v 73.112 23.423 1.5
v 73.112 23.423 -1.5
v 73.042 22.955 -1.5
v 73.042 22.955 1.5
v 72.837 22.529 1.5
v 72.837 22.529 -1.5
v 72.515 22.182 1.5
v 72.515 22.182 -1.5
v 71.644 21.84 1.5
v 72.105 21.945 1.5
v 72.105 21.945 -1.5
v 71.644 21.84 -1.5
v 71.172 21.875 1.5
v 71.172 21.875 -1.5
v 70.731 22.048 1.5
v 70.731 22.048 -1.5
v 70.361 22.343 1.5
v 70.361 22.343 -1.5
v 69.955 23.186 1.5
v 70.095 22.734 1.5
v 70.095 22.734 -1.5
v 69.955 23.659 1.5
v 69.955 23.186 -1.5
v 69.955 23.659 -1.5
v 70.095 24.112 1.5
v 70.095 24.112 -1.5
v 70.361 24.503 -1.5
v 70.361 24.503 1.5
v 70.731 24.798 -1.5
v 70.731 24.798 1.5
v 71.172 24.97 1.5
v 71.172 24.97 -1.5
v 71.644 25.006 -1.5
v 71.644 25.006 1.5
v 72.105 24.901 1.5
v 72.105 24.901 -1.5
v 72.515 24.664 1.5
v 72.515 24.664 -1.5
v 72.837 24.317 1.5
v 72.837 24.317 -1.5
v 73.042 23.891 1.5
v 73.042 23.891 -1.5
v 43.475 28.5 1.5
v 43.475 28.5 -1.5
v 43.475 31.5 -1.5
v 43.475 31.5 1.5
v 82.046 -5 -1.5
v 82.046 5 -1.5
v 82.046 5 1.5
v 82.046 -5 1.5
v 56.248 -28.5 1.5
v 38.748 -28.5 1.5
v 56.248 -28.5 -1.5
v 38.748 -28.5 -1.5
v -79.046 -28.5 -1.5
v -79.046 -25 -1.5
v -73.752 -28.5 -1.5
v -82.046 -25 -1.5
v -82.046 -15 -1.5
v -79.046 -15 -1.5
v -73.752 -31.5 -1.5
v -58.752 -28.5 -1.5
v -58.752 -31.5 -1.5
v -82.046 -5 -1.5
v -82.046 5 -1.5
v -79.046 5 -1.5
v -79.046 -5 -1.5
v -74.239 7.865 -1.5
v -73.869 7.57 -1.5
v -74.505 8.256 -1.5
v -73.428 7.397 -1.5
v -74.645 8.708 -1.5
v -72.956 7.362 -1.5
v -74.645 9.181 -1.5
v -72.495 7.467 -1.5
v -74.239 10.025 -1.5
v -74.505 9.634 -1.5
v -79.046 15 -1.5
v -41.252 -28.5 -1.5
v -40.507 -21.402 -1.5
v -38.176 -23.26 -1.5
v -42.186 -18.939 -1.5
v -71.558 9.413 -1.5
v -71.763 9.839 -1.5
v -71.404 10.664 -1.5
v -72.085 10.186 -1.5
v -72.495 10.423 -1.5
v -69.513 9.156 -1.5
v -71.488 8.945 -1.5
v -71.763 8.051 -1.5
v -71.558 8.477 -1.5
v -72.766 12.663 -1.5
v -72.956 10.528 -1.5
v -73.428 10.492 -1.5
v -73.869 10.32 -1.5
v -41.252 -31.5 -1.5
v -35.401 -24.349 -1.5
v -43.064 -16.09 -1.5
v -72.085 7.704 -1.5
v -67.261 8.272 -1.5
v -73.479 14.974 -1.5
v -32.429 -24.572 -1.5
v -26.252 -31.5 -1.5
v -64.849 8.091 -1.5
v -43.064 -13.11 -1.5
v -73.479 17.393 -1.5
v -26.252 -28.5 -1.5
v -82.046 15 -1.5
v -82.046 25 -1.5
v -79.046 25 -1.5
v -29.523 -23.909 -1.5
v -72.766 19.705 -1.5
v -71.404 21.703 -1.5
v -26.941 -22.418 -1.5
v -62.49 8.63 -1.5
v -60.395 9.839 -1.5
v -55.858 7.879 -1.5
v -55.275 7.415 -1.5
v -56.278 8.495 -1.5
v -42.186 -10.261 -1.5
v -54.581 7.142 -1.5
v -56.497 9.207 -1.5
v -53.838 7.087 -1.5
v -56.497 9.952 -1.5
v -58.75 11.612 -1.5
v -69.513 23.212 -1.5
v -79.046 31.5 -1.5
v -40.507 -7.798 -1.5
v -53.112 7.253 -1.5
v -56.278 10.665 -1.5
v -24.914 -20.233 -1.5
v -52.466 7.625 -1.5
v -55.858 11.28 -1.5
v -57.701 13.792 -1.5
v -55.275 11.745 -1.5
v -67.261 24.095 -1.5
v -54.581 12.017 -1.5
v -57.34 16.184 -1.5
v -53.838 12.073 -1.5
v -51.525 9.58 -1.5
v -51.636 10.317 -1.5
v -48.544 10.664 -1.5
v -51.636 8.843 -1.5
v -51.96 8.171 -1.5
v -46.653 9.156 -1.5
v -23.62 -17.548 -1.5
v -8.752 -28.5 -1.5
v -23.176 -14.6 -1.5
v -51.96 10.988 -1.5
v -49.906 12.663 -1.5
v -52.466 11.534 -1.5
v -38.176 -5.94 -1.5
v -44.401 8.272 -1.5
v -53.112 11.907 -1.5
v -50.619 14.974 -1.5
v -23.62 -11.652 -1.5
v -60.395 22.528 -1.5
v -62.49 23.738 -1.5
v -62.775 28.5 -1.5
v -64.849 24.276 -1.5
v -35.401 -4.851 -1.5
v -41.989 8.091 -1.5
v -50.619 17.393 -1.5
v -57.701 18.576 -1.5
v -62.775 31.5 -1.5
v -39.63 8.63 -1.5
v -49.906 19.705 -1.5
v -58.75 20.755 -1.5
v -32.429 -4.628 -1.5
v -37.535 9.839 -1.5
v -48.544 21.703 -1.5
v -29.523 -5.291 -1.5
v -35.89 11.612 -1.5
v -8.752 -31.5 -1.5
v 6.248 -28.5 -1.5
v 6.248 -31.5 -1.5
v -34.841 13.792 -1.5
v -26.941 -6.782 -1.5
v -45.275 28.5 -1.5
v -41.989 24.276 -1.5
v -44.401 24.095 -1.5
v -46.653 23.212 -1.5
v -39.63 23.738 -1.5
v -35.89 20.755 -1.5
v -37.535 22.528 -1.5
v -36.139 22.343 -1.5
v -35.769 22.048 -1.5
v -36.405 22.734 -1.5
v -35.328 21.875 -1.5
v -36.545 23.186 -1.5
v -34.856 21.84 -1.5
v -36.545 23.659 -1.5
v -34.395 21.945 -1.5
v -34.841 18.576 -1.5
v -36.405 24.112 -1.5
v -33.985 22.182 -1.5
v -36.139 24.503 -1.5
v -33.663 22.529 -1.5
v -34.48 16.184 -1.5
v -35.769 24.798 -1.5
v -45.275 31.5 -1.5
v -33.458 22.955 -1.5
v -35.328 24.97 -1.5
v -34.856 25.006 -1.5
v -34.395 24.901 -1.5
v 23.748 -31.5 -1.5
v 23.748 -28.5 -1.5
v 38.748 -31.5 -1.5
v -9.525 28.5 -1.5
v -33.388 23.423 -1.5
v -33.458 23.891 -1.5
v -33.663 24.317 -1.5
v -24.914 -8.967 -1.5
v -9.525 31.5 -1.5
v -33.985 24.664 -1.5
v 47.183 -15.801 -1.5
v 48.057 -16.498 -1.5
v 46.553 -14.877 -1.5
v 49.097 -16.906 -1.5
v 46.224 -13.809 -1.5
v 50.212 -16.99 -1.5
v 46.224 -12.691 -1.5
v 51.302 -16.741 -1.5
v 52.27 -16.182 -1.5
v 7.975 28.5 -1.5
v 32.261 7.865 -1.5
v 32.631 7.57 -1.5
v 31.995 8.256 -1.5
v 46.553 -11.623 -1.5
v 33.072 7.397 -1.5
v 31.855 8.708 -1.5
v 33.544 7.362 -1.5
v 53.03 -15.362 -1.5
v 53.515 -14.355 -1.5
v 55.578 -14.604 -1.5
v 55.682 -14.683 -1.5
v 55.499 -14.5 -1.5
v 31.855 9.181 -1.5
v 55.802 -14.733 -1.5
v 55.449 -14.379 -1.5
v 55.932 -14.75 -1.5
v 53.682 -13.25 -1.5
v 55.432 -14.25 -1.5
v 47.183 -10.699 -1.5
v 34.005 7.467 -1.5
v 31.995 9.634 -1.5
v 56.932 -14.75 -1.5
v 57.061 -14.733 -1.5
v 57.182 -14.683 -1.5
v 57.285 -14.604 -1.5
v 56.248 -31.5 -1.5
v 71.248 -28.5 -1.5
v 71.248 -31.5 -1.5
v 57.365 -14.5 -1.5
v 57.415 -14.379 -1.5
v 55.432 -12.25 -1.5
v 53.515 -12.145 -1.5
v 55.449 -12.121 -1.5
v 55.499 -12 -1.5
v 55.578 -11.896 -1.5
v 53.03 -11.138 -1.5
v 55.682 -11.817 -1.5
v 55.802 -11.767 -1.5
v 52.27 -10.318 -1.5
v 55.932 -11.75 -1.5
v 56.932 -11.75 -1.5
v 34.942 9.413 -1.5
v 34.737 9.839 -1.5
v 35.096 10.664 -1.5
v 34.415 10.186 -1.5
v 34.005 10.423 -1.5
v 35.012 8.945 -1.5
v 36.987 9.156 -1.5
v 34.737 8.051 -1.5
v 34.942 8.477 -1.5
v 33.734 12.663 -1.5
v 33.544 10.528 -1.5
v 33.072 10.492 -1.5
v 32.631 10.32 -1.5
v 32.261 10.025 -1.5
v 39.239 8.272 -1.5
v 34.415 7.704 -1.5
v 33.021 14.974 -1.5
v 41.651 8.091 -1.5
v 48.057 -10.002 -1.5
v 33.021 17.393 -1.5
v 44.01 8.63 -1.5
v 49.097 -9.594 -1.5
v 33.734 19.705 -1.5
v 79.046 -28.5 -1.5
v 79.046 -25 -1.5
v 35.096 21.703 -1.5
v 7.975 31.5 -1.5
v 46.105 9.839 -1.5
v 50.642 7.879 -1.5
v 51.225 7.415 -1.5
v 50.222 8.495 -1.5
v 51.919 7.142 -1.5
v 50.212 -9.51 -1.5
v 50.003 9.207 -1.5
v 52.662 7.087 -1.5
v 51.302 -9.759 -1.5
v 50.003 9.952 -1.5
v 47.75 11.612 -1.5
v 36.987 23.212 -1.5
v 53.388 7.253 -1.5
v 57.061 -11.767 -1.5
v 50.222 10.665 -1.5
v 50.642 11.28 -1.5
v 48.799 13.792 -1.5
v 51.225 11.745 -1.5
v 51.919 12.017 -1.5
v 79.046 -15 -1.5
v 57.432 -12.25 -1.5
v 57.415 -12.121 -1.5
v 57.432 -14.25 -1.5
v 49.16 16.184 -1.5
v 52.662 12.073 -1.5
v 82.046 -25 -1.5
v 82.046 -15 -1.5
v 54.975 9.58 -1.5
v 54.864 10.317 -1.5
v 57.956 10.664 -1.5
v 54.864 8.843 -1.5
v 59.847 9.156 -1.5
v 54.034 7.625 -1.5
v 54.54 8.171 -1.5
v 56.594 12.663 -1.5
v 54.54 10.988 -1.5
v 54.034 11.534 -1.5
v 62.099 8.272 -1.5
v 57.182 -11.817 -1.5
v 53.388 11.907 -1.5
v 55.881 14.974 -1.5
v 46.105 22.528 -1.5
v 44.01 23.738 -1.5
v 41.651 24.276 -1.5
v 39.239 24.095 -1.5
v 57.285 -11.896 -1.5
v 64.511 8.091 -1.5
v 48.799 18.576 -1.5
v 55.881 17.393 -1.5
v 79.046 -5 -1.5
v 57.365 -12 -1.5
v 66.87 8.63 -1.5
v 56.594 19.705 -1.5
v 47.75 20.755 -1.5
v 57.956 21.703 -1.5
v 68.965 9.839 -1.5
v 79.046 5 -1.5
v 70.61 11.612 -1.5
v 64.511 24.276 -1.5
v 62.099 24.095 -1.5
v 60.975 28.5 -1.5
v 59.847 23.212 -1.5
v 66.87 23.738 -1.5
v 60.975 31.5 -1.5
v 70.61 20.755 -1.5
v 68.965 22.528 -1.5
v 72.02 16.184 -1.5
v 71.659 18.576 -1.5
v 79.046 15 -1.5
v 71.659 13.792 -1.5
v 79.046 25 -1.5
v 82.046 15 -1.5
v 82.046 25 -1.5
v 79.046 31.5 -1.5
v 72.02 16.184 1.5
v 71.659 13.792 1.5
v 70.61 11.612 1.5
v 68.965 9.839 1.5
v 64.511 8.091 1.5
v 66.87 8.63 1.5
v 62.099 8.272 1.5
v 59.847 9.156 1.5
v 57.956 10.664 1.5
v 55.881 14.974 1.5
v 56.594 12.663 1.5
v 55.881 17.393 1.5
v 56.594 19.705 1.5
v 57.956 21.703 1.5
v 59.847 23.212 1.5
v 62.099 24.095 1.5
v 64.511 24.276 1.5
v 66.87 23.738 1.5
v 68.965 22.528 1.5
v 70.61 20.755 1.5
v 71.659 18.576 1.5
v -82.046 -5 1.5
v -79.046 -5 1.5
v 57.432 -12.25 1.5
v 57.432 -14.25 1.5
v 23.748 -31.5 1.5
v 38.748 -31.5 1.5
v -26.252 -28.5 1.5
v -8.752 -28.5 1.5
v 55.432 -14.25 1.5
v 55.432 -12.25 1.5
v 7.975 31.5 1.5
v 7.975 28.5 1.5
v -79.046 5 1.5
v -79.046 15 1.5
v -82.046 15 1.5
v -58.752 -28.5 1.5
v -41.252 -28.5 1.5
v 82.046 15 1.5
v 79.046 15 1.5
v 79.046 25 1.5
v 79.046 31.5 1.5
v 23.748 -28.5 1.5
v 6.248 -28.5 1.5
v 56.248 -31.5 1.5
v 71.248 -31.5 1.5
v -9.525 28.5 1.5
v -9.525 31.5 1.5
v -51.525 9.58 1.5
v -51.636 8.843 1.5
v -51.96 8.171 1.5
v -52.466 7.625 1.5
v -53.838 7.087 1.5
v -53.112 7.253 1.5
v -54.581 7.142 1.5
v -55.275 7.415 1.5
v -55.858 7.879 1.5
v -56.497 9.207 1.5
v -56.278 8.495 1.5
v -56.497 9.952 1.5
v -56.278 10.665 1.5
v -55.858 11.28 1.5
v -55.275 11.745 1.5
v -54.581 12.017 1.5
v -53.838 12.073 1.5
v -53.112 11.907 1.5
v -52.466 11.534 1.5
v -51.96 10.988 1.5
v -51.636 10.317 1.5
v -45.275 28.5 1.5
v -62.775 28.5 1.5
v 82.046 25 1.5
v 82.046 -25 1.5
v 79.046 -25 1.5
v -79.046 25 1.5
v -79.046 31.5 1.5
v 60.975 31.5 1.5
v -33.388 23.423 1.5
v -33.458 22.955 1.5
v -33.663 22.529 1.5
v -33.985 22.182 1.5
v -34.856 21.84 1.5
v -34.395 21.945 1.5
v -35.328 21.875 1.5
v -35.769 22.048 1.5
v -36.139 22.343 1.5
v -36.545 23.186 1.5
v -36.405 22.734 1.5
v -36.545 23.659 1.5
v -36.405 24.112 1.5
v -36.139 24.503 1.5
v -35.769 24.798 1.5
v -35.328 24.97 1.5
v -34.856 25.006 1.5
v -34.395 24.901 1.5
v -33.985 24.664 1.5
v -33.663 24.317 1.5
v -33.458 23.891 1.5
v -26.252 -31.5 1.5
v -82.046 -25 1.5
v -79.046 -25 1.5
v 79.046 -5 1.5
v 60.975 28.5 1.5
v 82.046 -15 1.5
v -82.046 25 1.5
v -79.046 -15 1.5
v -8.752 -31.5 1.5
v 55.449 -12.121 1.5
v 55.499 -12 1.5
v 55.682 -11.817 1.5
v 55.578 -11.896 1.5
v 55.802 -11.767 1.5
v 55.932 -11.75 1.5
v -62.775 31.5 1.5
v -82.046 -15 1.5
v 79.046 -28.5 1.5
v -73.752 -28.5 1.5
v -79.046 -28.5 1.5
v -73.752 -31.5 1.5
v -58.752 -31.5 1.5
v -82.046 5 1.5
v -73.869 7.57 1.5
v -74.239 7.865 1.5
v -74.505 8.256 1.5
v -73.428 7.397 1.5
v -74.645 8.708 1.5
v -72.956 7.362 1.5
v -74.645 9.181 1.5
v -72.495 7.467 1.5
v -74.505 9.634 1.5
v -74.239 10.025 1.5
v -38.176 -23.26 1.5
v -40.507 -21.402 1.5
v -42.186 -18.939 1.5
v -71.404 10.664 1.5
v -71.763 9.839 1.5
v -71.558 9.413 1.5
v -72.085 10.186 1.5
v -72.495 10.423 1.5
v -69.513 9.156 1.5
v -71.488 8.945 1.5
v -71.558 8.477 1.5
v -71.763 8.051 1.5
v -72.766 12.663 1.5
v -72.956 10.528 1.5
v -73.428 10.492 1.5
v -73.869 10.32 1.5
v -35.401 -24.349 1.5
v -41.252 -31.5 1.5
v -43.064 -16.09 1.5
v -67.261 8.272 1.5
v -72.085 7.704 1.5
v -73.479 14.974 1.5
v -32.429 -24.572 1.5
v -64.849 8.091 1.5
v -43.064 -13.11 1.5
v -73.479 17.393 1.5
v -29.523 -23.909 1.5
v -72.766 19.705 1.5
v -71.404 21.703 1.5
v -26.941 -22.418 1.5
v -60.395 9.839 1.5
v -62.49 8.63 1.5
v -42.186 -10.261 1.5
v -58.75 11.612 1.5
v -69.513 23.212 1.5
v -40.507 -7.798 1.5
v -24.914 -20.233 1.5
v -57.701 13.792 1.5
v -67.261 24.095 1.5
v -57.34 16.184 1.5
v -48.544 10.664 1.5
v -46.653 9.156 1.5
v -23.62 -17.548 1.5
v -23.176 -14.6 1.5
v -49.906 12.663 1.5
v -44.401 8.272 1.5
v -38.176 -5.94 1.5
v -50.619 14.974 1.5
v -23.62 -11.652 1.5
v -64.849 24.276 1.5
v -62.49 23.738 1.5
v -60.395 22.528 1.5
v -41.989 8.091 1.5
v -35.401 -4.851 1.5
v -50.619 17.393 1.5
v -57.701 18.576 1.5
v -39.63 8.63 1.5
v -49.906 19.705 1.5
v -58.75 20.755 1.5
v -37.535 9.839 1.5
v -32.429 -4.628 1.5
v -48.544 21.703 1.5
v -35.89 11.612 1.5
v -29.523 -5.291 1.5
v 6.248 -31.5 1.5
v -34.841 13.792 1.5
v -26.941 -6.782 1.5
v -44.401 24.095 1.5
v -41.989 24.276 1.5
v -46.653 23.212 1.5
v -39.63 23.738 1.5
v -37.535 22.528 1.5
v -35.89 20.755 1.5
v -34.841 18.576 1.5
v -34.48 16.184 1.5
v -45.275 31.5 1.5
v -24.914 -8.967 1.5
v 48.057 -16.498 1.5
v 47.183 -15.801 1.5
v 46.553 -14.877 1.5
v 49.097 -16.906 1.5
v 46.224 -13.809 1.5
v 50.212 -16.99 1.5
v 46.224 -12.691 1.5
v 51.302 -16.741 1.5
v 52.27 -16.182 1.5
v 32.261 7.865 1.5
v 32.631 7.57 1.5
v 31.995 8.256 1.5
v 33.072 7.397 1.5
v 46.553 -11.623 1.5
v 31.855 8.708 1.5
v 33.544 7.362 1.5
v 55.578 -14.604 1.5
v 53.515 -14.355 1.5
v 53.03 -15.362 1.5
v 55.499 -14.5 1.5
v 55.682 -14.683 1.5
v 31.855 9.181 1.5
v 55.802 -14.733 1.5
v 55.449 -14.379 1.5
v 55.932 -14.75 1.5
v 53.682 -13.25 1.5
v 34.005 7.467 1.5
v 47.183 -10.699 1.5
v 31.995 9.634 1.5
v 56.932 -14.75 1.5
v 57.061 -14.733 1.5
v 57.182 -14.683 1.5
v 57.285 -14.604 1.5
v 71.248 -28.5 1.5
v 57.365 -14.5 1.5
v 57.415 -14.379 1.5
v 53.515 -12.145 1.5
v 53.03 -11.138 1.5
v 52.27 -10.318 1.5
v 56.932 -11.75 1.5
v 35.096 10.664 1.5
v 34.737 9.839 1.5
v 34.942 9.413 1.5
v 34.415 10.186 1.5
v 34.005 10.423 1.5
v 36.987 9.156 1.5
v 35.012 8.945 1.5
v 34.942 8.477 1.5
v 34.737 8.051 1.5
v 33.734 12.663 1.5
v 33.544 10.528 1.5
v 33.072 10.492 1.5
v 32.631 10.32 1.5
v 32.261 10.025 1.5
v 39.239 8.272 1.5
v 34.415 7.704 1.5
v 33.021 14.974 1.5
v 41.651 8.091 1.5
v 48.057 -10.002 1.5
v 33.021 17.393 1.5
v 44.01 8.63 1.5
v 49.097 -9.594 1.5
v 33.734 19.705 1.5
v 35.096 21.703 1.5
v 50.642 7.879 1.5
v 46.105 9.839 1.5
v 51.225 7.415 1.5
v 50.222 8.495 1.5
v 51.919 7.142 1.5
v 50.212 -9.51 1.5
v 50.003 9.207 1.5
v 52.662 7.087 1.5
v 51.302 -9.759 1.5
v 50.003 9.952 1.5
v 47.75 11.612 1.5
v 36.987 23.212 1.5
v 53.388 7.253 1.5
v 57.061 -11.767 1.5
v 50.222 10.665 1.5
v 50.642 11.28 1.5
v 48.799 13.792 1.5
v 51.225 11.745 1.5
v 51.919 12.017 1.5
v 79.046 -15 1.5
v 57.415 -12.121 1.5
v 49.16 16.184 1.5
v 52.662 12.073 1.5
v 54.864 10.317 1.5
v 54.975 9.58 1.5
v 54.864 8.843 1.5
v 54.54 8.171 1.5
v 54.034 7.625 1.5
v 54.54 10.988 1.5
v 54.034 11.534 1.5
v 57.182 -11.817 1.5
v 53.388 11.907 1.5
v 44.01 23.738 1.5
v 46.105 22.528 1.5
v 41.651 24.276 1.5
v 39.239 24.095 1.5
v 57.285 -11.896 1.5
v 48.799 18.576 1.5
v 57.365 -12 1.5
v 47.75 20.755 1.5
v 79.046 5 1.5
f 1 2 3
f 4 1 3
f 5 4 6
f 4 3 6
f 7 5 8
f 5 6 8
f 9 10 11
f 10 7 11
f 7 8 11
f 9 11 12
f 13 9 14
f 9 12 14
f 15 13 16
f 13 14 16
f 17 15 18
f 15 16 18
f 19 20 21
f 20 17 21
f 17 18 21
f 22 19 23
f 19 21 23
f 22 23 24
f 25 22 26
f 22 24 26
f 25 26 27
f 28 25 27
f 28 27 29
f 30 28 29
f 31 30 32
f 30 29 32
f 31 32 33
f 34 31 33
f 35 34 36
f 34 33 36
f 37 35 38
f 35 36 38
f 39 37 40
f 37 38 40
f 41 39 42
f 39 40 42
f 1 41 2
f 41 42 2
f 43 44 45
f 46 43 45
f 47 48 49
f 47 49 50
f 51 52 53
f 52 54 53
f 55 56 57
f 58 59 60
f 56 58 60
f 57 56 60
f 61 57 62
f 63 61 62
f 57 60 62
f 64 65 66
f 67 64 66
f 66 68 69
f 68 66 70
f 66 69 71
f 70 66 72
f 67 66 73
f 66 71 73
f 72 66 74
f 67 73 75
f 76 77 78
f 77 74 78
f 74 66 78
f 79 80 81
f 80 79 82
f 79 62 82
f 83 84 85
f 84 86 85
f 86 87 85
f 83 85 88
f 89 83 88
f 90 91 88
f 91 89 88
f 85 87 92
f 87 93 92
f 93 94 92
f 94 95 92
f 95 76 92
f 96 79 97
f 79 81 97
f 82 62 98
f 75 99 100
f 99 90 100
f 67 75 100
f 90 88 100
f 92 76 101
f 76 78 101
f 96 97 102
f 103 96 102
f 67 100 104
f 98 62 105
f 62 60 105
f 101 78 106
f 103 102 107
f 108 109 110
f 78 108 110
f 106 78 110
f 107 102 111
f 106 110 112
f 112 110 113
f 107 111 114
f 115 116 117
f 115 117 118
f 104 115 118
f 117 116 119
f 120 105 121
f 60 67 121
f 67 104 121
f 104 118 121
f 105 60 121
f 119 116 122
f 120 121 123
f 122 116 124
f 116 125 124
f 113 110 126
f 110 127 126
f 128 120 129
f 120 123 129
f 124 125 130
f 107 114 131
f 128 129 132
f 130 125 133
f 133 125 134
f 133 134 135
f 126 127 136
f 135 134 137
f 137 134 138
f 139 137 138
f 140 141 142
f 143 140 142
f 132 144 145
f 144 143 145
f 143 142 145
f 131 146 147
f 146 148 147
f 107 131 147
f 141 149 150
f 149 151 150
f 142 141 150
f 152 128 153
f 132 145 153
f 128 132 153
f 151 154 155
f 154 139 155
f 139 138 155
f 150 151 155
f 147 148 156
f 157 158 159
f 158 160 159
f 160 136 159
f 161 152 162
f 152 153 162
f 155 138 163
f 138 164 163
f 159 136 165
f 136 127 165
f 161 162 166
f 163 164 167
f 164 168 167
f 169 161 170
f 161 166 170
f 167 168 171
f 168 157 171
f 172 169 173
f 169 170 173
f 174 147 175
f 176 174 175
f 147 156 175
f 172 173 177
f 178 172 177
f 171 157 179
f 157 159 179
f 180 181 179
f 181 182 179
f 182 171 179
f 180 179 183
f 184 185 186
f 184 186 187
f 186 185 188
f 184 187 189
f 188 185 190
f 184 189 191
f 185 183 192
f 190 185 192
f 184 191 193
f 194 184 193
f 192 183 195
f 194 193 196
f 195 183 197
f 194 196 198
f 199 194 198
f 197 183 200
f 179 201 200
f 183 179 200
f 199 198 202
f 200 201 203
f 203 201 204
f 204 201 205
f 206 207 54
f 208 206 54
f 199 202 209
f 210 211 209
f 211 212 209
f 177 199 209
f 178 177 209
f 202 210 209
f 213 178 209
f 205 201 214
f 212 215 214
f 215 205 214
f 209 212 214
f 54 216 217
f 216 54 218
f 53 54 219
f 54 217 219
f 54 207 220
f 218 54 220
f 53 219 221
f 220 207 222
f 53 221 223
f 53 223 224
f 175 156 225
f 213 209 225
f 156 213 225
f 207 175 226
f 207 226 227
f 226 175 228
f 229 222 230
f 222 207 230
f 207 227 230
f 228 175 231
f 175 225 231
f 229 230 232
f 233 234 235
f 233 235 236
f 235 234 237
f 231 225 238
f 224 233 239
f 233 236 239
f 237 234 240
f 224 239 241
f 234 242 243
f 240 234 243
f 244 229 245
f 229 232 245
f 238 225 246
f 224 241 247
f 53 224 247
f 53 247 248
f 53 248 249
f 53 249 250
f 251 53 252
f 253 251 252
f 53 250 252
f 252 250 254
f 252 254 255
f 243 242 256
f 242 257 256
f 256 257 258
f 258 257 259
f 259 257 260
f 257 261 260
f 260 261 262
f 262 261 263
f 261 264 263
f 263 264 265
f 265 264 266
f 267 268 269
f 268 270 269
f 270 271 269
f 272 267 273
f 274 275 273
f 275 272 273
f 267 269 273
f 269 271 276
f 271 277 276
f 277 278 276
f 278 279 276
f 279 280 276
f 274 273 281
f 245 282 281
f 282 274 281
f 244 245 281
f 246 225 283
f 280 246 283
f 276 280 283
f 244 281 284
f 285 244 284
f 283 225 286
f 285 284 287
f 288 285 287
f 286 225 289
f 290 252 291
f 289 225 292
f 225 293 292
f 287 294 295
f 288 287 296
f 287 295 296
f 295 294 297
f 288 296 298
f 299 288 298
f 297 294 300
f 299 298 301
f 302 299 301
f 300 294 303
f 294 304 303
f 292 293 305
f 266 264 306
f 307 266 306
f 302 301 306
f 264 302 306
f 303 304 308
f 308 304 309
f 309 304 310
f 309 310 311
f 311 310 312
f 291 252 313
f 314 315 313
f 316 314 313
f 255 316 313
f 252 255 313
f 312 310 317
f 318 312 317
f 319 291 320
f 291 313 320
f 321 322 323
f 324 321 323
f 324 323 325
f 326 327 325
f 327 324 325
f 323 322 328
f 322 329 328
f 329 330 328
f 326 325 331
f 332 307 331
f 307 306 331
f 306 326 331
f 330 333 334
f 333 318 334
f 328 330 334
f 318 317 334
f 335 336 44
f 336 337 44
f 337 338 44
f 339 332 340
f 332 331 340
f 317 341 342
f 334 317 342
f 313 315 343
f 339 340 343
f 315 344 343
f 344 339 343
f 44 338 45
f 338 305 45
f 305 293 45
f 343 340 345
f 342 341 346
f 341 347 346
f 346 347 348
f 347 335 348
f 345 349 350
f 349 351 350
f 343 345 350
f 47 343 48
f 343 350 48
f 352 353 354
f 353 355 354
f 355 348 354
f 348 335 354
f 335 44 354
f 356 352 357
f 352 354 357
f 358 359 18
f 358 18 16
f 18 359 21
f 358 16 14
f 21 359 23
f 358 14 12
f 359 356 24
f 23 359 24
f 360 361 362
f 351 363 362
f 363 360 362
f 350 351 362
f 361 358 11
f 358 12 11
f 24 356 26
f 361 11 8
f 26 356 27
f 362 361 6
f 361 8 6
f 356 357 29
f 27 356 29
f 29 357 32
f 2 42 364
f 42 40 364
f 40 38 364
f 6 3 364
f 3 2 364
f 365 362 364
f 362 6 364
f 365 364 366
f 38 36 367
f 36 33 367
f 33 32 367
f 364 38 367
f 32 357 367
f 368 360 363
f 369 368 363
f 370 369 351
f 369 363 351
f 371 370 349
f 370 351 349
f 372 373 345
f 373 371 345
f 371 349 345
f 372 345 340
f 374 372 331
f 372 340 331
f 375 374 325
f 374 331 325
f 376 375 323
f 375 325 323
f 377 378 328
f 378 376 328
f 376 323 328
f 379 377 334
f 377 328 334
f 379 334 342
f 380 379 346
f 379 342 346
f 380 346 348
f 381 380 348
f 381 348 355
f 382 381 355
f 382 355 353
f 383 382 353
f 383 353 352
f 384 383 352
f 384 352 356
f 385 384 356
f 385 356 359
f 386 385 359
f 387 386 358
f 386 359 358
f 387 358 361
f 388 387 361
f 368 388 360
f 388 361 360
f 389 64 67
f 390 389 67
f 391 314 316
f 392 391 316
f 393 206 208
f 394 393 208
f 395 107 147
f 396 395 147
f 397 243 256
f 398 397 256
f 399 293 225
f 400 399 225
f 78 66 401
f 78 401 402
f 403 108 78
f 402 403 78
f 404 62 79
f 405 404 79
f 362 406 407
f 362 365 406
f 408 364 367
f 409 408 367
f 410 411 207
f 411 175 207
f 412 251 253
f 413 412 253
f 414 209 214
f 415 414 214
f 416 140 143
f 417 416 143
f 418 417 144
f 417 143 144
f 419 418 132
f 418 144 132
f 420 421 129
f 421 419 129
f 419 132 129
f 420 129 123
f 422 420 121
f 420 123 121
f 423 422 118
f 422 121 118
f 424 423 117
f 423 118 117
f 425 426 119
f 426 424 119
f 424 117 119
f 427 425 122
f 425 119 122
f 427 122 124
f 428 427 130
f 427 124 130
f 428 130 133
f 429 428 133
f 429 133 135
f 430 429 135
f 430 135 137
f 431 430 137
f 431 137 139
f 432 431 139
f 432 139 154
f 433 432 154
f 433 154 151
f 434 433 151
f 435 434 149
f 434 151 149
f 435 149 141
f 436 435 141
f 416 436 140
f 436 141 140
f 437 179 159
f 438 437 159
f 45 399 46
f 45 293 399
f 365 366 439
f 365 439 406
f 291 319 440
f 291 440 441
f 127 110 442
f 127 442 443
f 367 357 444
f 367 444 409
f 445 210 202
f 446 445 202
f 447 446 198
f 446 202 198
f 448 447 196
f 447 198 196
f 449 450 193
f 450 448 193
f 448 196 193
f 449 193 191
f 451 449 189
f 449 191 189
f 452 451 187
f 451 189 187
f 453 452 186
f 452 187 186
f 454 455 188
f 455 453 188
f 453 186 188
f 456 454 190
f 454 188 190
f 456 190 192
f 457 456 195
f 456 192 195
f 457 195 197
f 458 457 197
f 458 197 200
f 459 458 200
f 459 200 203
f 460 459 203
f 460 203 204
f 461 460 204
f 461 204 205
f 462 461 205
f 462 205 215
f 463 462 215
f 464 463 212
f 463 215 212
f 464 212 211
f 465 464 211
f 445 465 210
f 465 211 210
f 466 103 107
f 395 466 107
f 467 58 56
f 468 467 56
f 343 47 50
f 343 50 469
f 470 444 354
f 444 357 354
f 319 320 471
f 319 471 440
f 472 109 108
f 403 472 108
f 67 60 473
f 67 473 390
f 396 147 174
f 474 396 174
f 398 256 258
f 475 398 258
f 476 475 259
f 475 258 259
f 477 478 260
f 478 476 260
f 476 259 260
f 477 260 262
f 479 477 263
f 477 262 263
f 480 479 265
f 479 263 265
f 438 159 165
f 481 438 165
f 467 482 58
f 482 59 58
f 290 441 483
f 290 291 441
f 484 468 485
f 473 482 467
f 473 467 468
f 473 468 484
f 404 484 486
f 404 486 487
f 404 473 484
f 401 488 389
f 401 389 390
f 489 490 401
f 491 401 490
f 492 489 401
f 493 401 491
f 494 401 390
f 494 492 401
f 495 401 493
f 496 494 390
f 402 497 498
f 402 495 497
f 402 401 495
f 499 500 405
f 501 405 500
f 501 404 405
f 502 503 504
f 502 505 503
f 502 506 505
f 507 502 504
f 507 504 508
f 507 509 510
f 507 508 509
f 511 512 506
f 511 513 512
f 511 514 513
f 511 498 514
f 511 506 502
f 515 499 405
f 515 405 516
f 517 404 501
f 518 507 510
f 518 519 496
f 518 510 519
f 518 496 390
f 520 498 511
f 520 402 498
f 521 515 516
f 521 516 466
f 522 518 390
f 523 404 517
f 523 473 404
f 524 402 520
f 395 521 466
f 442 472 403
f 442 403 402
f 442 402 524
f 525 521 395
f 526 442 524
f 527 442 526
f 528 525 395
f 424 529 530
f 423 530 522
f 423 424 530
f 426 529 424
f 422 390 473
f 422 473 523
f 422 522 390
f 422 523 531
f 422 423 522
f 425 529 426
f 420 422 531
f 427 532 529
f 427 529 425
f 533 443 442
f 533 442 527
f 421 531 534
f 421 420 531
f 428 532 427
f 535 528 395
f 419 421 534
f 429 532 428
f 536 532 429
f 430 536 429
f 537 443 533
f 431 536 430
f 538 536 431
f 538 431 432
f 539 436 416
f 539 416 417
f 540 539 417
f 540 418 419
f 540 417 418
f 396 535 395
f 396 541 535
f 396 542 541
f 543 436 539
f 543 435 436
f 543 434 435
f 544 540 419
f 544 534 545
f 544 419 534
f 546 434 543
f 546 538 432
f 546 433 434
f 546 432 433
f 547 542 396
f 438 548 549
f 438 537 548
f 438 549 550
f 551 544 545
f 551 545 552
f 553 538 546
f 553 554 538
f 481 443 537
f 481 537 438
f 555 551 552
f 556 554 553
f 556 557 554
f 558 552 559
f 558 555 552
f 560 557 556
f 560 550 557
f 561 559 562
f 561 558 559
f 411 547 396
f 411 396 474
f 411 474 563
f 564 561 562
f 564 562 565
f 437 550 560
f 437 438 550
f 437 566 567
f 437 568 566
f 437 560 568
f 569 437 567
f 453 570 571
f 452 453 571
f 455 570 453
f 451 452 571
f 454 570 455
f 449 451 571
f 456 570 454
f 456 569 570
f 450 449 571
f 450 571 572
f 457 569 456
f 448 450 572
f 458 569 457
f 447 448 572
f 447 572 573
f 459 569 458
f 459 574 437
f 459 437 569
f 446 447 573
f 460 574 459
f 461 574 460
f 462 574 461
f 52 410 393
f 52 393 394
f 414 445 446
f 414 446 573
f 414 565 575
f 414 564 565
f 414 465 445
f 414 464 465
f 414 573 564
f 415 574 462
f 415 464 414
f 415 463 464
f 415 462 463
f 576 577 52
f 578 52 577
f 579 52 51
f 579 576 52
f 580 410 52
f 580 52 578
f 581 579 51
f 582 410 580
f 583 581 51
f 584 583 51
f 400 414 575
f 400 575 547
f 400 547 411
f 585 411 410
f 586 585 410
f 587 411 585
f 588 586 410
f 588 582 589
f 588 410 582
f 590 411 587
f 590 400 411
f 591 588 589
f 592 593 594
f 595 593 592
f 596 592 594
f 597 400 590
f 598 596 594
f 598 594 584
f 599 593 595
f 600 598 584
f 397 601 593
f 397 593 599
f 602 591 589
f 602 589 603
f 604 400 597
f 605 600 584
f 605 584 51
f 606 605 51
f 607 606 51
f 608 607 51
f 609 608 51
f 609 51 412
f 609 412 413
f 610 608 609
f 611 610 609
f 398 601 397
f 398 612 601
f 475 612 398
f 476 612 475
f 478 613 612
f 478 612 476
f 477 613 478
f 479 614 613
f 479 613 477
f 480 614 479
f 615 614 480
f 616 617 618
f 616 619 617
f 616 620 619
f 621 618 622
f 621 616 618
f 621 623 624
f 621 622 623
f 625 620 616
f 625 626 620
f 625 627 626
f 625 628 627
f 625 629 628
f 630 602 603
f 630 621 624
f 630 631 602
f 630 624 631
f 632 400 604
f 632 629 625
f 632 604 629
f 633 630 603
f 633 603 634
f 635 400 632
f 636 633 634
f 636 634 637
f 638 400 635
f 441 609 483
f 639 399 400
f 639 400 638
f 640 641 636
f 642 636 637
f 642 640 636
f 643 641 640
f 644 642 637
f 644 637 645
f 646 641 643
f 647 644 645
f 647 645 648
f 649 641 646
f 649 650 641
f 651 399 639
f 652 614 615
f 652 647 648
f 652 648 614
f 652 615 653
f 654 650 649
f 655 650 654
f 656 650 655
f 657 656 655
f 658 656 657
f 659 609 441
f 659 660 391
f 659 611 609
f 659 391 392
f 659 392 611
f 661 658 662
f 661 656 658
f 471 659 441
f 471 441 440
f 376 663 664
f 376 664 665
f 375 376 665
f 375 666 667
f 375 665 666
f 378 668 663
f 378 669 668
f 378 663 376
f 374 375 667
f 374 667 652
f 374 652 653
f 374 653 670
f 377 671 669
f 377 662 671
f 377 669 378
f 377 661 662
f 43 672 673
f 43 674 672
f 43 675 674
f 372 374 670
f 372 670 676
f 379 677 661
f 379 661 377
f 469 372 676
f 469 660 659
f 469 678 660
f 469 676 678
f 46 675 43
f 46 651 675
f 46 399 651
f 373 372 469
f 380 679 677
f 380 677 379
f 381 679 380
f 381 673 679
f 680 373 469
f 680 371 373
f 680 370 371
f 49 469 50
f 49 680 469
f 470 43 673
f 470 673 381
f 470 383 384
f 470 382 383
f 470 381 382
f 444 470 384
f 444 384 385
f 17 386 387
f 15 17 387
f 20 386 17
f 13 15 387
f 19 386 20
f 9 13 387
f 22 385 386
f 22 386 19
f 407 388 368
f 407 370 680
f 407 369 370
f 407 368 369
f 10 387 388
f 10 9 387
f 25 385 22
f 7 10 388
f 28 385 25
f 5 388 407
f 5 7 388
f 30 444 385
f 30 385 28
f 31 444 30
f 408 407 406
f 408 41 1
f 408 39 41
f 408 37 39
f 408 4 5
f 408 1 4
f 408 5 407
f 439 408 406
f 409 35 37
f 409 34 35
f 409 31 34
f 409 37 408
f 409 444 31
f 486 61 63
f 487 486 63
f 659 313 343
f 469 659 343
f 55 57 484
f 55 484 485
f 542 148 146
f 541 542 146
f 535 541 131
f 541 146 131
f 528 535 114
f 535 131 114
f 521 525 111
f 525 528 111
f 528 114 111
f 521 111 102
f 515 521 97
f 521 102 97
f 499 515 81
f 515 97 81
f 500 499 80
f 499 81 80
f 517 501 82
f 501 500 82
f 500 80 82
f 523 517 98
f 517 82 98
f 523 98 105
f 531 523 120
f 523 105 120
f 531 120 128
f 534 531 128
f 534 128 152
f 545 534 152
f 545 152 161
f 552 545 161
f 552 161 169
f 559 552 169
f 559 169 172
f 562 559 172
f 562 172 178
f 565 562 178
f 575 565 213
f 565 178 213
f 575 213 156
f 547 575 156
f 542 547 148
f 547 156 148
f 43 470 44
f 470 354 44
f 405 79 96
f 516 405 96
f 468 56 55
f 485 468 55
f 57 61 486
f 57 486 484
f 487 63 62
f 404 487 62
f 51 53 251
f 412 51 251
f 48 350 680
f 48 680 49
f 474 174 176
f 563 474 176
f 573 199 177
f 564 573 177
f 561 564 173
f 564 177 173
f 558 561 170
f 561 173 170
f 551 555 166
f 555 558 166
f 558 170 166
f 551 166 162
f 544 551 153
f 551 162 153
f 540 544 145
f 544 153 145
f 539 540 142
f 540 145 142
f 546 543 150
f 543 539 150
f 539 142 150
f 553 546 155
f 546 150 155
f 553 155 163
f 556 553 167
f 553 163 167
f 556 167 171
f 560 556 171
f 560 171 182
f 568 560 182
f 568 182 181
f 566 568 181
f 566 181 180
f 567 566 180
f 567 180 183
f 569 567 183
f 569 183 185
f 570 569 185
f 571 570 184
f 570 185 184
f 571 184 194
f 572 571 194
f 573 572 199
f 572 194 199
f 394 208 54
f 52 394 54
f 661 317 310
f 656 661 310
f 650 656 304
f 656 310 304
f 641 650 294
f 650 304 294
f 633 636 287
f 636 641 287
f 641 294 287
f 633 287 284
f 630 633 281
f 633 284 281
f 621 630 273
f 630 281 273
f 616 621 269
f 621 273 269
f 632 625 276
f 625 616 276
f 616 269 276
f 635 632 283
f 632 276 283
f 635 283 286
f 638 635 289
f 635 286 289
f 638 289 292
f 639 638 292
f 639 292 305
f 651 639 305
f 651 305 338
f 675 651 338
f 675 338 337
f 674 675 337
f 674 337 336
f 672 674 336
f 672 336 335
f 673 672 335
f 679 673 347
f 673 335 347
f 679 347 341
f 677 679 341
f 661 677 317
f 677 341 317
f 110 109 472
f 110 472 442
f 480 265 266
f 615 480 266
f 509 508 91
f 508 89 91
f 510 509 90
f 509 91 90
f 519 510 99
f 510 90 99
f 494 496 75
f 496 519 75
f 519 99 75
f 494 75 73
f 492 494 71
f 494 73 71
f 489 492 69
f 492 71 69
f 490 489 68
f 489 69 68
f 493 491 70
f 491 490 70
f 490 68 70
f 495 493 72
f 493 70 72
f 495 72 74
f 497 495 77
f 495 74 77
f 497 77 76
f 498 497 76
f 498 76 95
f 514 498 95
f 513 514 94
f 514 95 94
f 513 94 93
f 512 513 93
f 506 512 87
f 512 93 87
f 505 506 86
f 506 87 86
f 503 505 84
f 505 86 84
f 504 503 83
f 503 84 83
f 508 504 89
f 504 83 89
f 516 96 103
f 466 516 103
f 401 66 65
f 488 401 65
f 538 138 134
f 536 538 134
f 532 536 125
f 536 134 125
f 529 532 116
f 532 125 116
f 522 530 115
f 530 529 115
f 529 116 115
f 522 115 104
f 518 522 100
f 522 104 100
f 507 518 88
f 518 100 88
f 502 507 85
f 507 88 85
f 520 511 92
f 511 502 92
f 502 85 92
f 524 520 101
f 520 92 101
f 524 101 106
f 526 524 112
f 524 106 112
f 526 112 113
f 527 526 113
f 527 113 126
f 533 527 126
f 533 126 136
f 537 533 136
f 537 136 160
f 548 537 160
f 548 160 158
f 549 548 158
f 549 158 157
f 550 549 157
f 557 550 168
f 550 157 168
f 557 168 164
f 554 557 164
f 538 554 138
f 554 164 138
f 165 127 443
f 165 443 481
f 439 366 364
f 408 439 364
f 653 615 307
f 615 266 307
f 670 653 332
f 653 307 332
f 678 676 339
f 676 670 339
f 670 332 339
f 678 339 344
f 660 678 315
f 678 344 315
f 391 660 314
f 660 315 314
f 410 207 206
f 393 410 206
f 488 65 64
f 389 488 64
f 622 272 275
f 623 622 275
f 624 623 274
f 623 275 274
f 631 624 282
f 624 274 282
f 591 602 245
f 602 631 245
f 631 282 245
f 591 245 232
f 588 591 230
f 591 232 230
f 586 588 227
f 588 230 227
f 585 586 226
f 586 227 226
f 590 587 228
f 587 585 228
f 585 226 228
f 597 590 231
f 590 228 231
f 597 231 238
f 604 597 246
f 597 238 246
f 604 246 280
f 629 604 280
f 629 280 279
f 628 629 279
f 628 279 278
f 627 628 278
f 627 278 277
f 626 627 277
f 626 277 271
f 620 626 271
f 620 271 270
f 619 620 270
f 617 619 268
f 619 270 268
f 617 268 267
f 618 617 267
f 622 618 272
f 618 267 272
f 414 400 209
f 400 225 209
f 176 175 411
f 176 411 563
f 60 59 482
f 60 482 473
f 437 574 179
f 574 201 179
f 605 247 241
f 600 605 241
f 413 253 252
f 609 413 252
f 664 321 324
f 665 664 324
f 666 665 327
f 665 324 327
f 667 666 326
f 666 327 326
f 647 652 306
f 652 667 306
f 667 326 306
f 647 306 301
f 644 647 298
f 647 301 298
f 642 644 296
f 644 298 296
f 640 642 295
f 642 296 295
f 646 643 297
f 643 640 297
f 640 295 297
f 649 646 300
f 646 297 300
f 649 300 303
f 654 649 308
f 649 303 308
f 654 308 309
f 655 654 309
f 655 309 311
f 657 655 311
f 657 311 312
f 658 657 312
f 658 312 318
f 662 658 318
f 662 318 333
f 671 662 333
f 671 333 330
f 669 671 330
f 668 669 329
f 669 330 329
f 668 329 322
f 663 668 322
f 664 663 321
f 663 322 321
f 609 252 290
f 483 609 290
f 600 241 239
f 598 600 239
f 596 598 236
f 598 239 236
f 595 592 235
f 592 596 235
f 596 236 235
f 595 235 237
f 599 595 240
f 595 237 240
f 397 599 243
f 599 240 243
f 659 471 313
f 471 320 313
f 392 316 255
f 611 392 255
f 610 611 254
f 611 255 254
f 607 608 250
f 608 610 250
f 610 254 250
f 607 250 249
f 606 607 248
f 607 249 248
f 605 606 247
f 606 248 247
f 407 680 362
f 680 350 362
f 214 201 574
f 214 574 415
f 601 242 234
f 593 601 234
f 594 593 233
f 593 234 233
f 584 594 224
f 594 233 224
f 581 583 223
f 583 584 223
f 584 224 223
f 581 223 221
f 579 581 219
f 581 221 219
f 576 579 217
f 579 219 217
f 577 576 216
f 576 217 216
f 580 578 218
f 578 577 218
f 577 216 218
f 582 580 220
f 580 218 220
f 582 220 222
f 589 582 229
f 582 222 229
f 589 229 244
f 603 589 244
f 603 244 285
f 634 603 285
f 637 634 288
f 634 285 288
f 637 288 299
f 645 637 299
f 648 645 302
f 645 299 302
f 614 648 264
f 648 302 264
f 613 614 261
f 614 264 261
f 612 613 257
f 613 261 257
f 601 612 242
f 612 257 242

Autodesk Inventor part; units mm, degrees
ref_plane "YZ Plane" through (0, 0, 0) normal (1, 0, 0) x (0, 1, 0)
ref_plane "XZ Plane" through (0, 0, 0) normal (0, 1, 0) x (-1, 0, 0)
ref_plane "XY Plane" through (0, 0, 0) normal (0, 0, 1) x (1, 0, 0)
sketch "Sketch1" plane through (0, 0, 0) normal (0, 0, 1) x (1, 0, 0)
  line L0 (-79.046, 31.5) -> (-62.7751, 31.5)
  line L1 (-62.7751, 28.5) -> (-62.7751, 31.5)
  line L2 (-45.2751, 28.5) -> (-62.7751, 28.5)
  line L3 (-45.2751, 31.5) -> (-45.2751, 28.5)
  line L4 (-45.2751, 31.5) -> (-26.3822, 31.5)
  line L5 (-26.3822, 31.5) -> (-9.5251, 31.5)
  line L6 (-9.5251, 28.5) -> (-9.5251, 31.5)
  line L7 (7.9749, 28.5) -> (-9.5251, 28.5)
  line L8 (7.9749, 31.5) -> (7.9749, 28.5)
  line L9 (7.9749, 31.5) -> (24.8319, 31.5)
  line L10 (24.8319, 31.5) -> (43.4749, 31.5)
  line L11 (43.4749, 28.5) -> (43.4749, 31.5)
  line L12 (60.9749, 28.5) -> (43.4749, 28.5)
  line L13 (60.9749, 31.5) -> (60.9749, 28.5)
  line L14 (60.9749, 31.5) -> (79.046, 31.5)
  circle A0 centre (-73.0751, 8.9448) radius 1.5875
  circle A1 centre (-65.4551, 16.1838) radius 8.115
  circle A2 centre (-42.5951, 16.1838) radius 8.115
  circle A3 centre (-54.0251, 9.5798) radius 2.5
  circle A4 centre (-34.9751, 23.4228) radius 1.5875
  circle A5 centre (33.4249, 8.9448) radius 1.5875
  circle A6 centre (52.4749, 9.5798) radius 2.5
  circle A7 centre (41.0449, 16.1838) radius 8.115
  circle A8 centre (63.9049, 16.1838) radius 8.115
  circle A9 centre (71.5249, 23.4228) radius 1.5875
  circle A10 centre (49.9319, -13.25) radius 3.75
  line L15 (55.4319, -14.25) -> (55.4319, -12.25)
  arc A11 (55.9319, -11.75) -> (55.4319, -12.25) centre (55.9319, -12.25) ccw
  line L16 (55.9319, -11.75) -> (56.9319, -11.75)
  arc A12 (57.4319, -12.25) -> (56.9319, -11.75) centre (56.9319, -12.25) ccw
  line L17 (57.4319, -12.25) -> (57.4319, -14.25)
  arc A13 (56.9319, -14.75) -> (57.4319, -14.25) centre (56.9319, -14.25) ccw
  line L18 (56.9319, -14.75) -> (55.9319, -14.75)
  arc A14 (55.4319, -14.25) -> (55.9319, -14.75) centre (55.9319, -14.25) ccw
  circle A15 centre (-33.176, -14.6) radius 10
  line L19 (-79.046, 31.5) -> (79.046, -31.5) construction
  line L20 (79.046, 31.5) -> (-79.046, -31.5) construction
  line L21 (-8.7519, -31.5) -> (6.2481, -31.5)
  line L22 (-8.7519, -31.5) -> (6.2481, -28.5) construction
  line L23 (6.2481, -31.5) -> (-8.7519, -28.5) construction
  line L24 (-41.2519, -31.5) -> (-26.2519, -31.5)
  line L25 (-73.7519, -31.5) -> (-58.7519, -31.5)
  line L26 (23.7481, -31.5) -> (38.7481, -31.5)
  line L27 (-8.7519, -31.5) -> (6.2481, -31.5)
  line L28 (-41.2519, -31.5) -> (-26.2519, -31.5)
  line L29 (56.2481, -31.5) -> (71.2481, -31.5)
  line L30 (23.7481, -31.5) -> (38.7481, -31.5)
  line L31 (-8.7519, -31.5) -> (6.2481, -31.5)
  line L32 (-58.7519, -31.5) -> (-58.7519, -28.5)
  line L33 (-58.7519, -28.5) -> (-41.2519, -28.5)
  line L34 (-41.2519, -28.5) -> (-41.2519, -31.5)
  line L35 (-26.2519, -31.5) -> (-26.2519, -28.5)
  line L36 (-26.2519, -28.5) -> (-8.7519, -28.5)
  line L37 (-8.7519, -28.5) -> (-8.7519, -31.5)
  line L38 (6.2481, -28.5) -> (23.7481, -28.5)
  line L39 (23.7481, -28.5) -> (23.7481, -31.5)
  line L40 (38.7481, -31.5) -> (38.7481, -28.5)
  line L41 (38.7481, -28.5) -> (56.2481, -28.5)
  line L42 (56.2481, -28.5) -> (56.2481, -31.5)
  line L43 (71.2481, -31.5) -> (71.2481, -28.5)
  line L44 (71.2481, -28.5) -> (79.046, -28.5)
  line L45 (-73.7519, -31.5) -> (-73.7519, -28.5)
  line L46 (-73.7519, -28.5) -> (-79.046, -28.5)
  line L47 (-79.046, 5) -> (-82.046, 5)
  line L48 (-82.046, 5) -> (-82.046, -5)
  line L49 (-82.046, -5) -> (-79.046, -5)
  line L50 (-79.046, 5) -> (-82.046, -5) construction
  line L51 (-82.046, 5) -> (-79.046, -5) construction
  line L52 (0, 0) -> (0, 17) construction
  line L53 (-82.046, 25) -> (-82.046, 15)
  line L54 (-82.046, -15) -> (-82.046, -25)
  line L55 (-82.046, 5) -> (-82.046, -5)
  line L56 (-82.046, 25) -> (-79.046, 25)
  line L57 (-82.046, 15) -> (-79.046, 15)
  line L58 (-82.046, -15) -> (-79.046, -15)
  line L59 (-82.046, -25) -> (-79.046, -25)
  line L60 (-79.046, -25) -> (-79.046, -28.5)
  line L61 (-79.046, -15) -> (-79.046, -5)
  line L62 (-79.046, 5) -> (-79.046, 15)
  line L63 (-79.046, 25) -> (-79.046, 31.5)
  line L64 (79.046, 5) -> (82.046, 5)
  line L65 (82.046, 5) -> (82.046, -5)
  line L66 (82.046, -5) -> (79.046, -5)
  line L67 (79.046, 5) -> (82.046, -5) construction
  line L68 (82.046, 5) -> (79.046, -5) construction
  line L69 (82.046, 25) -> (82.046, 15)
  line L70 (82.046, -15) -> (82.046, -25)
  line L71 (82.046, 5) -> (82.046, -5)
  line L72 (82.046, 25) -> (79.046, 25)
  line L73 (82.046, 15) -> (79.046, 15)
  line L74 (82.046, -15) -> (79.046, -15)
  line L75 (82.046, -25) -> (79.046, -25)
  line L76 (79.046, -25) -> (79.046, -28.5)
  line L77 (79.046, -15) -> (79.046, -5)
  line L78 (79.046, 5) -> (79.046, 15)
  line L79 (79.046, 25) -> (79.046, 31.5)
  line L80 (6.2481, -28.5) -> (6.2481, -31.5)
  point P0 (0, 0)
  point P1 (-1.2519, -30)
  point P2 (-80.546, 0)
  point P3 (80.546, 0)
  dimension "d2" = 20
  dimension "d4" = 15
  dimension "d5" = 3
  dimension "d10" = 32.5
  dimension "d13" = 32.5
  dimension "d17" = 3
  dimension "d18" = 10
  dimension "d21" = 20
  dimension "d24" = 20
extrude "Extrusion1" add sketch "Sketch1" along normal mid plane 3
properties part number "srfsamping"
